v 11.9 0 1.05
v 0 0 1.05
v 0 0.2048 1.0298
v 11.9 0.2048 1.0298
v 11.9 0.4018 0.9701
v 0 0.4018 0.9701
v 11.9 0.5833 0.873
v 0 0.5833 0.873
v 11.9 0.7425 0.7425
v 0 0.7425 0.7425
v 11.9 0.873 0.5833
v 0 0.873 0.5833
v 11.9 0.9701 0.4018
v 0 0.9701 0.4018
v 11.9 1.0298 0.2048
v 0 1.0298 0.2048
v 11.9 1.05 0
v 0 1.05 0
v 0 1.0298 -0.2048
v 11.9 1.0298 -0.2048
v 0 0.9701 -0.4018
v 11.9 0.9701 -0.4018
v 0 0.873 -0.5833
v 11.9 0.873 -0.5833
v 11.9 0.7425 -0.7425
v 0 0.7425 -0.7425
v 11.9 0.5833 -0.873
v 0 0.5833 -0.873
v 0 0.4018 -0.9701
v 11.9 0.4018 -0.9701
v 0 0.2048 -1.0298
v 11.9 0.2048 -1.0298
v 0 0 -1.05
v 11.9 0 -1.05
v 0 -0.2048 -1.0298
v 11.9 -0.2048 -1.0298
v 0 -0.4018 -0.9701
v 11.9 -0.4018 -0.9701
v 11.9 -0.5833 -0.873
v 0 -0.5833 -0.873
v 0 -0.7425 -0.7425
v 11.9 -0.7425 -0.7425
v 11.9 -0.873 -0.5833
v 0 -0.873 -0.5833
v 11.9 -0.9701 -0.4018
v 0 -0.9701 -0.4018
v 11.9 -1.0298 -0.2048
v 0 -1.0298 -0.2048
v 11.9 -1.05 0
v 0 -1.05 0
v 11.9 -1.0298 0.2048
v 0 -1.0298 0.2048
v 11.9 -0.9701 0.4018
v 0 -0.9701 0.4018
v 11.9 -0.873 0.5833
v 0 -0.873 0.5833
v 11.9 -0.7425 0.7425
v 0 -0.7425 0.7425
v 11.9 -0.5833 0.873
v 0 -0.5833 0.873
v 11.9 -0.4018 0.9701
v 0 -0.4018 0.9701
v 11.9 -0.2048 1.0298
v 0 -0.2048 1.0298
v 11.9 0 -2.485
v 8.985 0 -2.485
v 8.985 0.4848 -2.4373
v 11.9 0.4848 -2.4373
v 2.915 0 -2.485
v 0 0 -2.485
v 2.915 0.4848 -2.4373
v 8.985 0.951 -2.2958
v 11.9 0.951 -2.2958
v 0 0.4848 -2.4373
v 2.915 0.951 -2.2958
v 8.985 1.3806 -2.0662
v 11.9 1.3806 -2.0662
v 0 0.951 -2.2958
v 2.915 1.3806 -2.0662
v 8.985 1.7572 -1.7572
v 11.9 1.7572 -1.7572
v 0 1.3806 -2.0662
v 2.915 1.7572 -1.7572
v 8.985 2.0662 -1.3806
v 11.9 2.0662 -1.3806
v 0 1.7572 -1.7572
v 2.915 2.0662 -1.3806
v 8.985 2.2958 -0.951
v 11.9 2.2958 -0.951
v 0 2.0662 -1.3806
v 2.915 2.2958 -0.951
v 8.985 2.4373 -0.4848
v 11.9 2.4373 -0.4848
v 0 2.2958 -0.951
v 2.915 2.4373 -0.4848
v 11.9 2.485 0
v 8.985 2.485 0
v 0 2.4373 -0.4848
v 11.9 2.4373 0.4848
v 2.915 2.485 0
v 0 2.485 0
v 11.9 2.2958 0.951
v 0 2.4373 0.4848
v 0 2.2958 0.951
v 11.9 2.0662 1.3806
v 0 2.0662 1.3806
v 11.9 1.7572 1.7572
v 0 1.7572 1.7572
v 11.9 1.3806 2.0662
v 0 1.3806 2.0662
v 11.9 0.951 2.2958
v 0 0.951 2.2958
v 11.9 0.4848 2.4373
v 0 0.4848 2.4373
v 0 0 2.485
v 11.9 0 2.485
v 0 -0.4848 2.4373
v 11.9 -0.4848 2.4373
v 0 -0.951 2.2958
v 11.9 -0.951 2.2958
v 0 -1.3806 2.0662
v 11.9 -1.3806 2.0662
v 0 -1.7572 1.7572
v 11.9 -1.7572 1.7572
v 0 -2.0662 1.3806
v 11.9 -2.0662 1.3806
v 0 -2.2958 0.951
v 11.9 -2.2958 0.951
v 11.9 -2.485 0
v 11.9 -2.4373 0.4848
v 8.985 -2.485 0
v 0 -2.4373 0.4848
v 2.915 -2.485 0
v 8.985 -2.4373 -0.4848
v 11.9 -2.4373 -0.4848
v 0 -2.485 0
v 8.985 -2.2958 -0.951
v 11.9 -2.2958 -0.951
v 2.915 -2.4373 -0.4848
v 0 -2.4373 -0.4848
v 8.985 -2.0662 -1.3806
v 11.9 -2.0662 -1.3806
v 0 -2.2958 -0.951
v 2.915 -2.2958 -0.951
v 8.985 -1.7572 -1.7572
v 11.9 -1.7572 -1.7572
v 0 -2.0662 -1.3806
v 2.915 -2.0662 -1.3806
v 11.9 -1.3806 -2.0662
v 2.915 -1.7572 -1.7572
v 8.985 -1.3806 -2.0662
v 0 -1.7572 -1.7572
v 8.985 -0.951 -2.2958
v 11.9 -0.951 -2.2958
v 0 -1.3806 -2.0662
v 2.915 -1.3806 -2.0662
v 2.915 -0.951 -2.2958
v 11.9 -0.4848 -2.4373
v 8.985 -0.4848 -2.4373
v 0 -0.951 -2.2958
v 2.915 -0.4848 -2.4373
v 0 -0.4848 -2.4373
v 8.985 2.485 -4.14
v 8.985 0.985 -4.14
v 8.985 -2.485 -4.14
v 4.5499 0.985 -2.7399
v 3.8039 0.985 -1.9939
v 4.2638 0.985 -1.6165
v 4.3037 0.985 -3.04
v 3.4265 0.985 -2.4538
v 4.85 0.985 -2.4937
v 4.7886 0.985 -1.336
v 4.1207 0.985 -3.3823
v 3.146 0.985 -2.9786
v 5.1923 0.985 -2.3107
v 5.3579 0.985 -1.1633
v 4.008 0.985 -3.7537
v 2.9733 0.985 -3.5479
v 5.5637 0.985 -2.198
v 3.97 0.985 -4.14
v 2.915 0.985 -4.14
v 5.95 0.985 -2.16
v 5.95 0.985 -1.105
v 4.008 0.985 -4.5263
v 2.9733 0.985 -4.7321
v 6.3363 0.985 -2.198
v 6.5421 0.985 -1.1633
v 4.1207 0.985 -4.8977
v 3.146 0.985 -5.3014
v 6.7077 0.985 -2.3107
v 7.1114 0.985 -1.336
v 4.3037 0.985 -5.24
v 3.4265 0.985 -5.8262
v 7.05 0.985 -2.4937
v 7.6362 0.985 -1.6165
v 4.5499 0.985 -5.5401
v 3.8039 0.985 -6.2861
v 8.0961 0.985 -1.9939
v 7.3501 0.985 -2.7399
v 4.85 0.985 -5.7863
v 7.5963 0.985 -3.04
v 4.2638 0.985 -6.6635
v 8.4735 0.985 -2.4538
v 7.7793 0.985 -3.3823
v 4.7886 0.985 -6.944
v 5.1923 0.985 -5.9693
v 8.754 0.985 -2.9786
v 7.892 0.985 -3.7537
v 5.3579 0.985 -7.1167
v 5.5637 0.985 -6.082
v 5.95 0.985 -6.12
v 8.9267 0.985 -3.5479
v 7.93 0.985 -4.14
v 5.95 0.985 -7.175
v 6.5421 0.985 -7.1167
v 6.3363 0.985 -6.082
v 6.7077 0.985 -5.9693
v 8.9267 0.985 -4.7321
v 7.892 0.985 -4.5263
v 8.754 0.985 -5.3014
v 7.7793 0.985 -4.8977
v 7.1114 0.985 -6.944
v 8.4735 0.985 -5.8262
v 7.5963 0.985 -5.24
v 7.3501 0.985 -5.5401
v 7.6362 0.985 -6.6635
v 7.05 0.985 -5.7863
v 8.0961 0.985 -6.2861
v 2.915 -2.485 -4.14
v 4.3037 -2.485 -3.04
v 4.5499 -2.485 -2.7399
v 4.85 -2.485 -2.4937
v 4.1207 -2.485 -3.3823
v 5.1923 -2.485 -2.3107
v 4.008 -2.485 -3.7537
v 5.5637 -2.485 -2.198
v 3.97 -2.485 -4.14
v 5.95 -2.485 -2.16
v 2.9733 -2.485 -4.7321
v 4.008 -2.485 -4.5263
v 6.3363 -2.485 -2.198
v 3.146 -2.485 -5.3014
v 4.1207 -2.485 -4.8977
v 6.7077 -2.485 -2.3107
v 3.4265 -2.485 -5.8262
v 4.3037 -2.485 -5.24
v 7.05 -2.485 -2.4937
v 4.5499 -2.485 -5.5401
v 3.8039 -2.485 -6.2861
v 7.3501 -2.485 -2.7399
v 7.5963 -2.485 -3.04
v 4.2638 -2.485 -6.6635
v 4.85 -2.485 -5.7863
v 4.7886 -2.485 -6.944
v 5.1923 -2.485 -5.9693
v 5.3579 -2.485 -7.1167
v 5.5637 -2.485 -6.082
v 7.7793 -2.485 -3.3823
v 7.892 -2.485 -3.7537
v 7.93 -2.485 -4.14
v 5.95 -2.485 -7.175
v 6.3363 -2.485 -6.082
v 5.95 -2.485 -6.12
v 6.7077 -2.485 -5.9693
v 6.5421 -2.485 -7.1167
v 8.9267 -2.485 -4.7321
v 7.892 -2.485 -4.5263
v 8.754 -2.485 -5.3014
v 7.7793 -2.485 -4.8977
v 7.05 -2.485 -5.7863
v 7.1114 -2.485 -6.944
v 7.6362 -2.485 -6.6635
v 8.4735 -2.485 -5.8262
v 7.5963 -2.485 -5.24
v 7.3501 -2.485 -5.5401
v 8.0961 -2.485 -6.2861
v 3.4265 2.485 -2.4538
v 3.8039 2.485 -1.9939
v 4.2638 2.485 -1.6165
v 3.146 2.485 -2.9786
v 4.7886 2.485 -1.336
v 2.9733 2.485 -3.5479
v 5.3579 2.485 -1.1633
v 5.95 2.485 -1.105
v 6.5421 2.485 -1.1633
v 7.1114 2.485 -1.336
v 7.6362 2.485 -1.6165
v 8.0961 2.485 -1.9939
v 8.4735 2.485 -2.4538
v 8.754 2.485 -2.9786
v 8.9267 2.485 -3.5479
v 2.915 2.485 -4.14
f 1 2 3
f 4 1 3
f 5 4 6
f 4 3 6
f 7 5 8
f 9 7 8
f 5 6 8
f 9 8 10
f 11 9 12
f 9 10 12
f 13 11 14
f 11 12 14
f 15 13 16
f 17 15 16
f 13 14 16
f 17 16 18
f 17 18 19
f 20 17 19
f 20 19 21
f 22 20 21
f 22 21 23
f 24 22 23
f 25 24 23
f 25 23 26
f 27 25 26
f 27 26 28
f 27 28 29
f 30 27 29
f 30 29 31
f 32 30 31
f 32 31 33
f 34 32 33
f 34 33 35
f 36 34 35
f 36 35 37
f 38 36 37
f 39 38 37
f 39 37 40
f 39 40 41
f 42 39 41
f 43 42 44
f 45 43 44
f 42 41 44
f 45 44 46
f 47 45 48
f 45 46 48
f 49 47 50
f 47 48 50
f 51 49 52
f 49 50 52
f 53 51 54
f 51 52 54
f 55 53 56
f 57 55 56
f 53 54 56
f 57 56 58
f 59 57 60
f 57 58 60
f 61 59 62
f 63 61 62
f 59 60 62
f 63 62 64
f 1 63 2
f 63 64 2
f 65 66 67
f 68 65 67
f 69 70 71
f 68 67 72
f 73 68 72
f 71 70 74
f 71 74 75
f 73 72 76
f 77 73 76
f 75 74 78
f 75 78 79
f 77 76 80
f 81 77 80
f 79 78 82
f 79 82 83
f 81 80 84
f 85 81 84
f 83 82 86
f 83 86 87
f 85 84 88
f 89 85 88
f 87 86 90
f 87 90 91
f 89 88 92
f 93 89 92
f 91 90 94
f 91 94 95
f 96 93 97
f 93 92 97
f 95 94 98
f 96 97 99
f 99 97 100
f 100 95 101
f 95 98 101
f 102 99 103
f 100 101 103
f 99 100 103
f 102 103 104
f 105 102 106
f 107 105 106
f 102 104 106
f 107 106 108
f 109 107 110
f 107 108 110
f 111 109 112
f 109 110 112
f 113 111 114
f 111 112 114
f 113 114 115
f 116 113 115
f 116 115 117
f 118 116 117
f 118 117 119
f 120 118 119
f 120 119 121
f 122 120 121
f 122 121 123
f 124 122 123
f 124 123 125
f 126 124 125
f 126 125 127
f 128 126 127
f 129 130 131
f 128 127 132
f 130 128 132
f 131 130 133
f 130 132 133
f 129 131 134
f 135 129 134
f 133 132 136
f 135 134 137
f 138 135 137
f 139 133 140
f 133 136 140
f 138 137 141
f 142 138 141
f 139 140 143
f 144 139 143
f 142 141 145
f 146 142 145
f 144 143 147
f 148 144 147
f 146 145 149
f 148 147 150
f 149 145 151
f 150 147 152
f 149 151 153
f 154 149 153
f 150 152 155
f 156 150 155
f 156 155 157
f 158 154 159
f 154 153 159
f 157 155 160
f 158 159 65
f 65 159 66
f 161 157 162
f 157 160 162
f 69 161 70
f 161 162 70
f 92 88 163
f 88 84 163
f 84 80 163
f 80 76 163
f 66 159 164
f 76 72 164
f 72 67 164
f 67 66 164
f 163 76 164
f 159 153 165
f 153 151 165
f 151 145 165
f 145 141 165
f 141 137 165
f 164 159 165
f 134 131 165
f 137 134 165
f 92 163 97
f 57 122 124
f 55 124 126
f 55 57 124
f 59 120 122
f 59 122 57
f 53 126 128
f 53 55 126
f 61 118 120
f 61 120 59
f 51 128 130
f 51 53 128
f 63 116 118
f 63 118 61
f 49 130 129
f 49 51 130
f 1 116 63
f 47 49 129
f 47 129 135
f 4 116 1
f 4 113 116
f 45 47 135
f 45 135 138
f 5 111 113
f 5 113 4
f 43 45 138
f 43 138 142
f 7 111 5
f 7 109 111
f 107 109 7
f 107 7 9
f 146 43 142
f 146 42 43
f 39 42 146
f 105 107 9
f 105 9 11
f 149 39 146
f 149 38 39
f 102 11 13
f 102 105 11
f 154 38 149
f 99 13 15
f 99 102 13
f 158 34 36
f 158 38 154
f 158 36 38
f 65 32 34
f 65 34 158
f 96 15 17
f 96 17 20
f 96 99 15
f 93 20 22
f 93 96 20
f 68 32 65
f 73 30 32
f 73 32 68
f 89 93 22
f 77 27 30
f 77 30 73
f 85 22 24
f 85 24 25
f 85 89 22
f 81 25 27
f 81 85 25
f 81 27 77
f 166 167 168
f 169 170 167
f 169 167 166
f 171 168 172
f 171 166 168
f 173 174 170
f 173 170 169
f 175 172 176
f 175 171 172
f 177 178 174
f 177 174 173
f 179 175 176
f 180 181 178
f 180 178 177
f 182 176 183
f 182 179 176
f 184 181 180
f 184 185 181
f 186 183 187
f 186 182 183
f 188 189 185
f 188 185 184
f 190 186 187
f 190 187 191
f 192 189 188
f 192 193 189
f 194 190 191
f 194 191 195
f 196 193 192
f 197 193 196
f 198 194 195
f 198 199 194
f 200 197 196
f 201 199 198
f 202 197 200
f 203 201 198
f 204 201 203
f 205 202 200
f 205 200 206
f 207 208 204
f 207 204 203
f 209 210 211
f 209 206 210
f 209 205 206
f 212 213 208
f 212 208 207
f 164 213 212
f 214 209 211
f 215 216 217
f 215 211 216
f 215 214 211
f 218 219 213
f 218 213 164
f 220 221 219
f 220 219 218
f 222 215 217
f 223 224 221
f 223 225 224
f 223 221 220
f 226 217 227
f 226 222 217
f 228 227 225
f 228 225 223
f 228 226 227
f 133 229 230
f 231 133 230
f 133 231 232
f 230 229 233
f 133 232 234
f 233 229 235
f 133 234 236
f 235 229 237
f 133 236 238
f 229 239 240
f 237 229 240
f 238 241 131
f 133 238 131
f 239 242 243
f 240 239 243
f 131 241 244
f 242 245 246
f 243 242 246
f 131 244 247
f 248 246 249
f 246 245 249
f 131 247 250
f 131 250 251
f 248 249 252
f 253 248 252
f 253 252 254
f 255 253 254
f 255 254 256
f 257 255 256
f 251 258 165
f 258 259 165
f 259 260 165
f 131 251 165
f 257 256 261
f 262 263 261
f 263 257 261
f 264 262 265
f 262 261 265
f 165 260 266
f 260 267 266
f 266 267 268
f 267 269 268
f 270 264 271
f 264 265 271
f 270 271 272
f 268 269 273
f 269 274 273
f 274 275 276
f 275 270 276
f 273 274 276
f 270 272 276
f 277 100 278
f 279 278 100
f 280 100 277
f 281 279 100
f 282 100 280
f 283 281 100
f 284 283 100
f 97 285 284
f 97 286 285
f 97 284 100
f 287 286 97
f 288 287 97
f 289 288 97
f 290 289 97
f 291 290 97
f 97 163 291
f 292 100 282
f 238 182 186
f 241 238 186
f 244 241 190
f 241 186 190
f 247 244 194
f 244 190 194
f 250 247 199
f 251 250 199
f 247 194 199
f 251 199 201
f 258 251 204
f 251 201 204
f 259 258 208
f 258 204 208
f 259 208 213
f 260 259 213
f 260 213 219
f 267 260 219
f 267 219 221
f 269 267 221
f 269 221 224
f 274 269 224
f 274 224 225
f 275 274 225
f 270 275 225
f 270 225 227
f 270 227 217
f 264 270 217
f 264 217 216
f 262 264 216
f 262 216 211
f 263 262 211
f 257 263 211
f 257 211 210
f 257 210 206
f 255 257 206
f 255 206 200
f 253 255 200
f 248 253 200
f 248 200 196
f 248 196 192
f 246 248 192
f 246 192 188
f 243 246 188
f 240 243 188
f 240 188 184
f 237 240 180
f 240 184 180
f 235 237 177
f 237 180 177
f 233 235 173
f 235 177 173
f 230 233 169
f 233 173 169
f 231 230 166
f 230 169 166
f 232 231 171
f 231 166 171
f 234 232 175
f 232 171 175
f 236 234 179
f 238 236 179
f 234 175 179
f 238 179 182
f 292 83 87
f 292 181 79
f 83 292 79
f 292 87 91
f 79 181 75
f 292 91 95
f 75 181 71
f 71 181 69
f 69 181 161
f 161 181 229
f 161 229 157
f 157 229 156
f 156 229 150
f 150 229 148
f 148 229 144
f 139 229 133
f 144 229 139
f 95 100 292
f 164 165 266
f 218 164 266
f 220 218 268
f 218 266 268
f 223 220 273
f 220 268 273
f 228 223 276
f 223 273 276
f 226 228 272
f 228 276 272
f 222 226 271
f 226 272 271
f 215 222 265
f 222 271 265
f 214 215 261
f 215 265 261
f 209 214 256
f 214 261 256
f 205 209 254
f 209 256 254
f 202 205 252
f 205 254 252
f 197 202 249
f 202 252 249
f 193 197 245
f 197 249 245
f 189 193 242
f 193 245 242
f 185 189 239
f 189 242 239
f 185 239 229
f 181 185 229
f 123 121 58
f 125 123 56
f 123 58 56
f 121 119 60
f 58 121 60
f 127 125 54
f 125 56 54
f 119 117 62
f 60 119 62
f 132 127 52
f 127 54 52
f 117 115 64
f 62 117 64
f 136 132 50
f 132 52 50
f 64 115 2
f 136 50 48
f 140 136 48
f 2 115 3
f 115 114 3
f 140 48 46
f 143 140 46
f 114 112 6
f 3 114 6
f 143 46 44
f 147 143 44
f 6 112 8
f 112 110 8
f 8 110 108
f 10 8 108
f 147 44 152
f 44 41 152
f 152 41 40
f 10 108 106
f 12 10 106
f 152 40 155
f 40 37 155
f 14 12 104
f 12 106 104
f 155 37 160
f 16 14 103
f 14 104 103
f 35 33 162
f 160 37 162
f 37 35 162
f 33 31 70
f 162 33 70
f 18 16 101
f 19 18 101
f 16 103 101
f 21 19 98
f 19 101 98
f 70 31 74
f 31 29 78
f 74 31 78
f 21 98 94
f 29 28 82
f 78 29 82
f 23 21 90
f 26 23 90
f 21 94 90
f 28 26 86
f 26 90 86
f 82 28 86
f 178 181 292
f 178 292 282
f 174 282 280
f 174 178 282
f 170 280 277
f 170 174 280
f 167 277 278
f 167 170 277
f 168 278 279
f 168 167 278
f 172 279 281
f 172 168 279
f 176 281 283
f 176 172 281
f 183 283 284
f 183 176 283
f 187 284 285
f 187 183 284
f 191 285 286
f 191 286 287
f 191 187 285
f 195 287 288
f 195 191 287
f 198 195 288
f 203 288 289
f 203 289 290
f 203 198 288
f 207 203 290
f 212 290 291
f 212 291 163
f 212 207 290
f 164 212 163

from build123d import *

# Parameters (mm, degrees)
SCHIZZO1_R                   = 2.485
ESTRUSIONE_ESTRUSIONE1_DEPTH = 11.9
ESTRUSIONE_ESTRUSIONE2_DEPTH = 2.485
SCHIZZO3_R                   = 1.98
TAGLIO_ESTRUSIONE1_DEPTH     = 15.757761517
SCHIZZO4_R                   = 1.05
TAGLIO_ESTRUSIONE2_DEPTH     = 15.116155638
SCHIZZO5_R                   = 3.035
TAGLIO_ESTRUSIONE3_DEPTH     = 1.5


with BuildPart() as part:
    # Schizzo1 → Estrusione-Estrusione1 (new body)
    with BuildSketch(Plane(origin=(0, 0, 0), x_dir=(0, 0, -1), z_dir=(1, 0, 0))):
        Circle(SCHIZZO1_R)
    extrude(amount=ESTRUSIONE_ESTRUSIONE1_DEPTH)

    # Schizzo2 → Estrusione-Estrusione2 (add, symmetric)
    with BuildSketch(Plane(origin=(0, 0, 0), x_dir=(1, 0, 0), z_dir=(0, 1, 0))):
        with BuildLine():
            Line((8.985, 0), (8.985, 4.14))
            ThreePointArc((8.985, 4.14), (5.95, 7.175), (2.915, 4.14))
            Line((2.915, 4.14), (2.915, 0))
            Line((2.915, 0), (8.985, 0))
        make_face()
    extrude(amount=ESTRUSIONE_ESTRUSIONE2_DEPTH, both=True)

    # Schizzo3 → Taglio-Estrusione1 (cut, through all)
    with BuildSketch(Plane(origin=(0, 2.485, 0), x_dir=(1, 0, 0), z_dir=(0, 1, 0))):
        with Locations((5.95, 4.14)):
            Circle(SCHIZZO3_R)
    extrude(amount=-TAGLIO_ESTRUSIONE1_DEPTH, mode=Mode.SUBTRACT)

    # Schizzo4 → Taglio-Estrusione2 (cut, through all)
    with BuildSketch(Plane.ZY):
        Circle(SCHIZZO4_R)
    extrude(amount=-TAGLIO_ESTRUSIONE2_DEPTH, mode=Mode.SUBTRACT)

    # Schizzo5 → Taglio-Estrusione3 (cut)
    with BuildSketch(Plane(origin=(0, 2.485, 0), x_dir=(1, 0, 0), z_dir=(0, 1, 0))):
        with Locations((5.95, 4.14)):
            Circle(SCHIZZO5_R)
    extrude(amount=-TAGLIO_ESTRUSIONE3_DEPTH, mode=Mode.SUBTRACT)


solid = part.part
